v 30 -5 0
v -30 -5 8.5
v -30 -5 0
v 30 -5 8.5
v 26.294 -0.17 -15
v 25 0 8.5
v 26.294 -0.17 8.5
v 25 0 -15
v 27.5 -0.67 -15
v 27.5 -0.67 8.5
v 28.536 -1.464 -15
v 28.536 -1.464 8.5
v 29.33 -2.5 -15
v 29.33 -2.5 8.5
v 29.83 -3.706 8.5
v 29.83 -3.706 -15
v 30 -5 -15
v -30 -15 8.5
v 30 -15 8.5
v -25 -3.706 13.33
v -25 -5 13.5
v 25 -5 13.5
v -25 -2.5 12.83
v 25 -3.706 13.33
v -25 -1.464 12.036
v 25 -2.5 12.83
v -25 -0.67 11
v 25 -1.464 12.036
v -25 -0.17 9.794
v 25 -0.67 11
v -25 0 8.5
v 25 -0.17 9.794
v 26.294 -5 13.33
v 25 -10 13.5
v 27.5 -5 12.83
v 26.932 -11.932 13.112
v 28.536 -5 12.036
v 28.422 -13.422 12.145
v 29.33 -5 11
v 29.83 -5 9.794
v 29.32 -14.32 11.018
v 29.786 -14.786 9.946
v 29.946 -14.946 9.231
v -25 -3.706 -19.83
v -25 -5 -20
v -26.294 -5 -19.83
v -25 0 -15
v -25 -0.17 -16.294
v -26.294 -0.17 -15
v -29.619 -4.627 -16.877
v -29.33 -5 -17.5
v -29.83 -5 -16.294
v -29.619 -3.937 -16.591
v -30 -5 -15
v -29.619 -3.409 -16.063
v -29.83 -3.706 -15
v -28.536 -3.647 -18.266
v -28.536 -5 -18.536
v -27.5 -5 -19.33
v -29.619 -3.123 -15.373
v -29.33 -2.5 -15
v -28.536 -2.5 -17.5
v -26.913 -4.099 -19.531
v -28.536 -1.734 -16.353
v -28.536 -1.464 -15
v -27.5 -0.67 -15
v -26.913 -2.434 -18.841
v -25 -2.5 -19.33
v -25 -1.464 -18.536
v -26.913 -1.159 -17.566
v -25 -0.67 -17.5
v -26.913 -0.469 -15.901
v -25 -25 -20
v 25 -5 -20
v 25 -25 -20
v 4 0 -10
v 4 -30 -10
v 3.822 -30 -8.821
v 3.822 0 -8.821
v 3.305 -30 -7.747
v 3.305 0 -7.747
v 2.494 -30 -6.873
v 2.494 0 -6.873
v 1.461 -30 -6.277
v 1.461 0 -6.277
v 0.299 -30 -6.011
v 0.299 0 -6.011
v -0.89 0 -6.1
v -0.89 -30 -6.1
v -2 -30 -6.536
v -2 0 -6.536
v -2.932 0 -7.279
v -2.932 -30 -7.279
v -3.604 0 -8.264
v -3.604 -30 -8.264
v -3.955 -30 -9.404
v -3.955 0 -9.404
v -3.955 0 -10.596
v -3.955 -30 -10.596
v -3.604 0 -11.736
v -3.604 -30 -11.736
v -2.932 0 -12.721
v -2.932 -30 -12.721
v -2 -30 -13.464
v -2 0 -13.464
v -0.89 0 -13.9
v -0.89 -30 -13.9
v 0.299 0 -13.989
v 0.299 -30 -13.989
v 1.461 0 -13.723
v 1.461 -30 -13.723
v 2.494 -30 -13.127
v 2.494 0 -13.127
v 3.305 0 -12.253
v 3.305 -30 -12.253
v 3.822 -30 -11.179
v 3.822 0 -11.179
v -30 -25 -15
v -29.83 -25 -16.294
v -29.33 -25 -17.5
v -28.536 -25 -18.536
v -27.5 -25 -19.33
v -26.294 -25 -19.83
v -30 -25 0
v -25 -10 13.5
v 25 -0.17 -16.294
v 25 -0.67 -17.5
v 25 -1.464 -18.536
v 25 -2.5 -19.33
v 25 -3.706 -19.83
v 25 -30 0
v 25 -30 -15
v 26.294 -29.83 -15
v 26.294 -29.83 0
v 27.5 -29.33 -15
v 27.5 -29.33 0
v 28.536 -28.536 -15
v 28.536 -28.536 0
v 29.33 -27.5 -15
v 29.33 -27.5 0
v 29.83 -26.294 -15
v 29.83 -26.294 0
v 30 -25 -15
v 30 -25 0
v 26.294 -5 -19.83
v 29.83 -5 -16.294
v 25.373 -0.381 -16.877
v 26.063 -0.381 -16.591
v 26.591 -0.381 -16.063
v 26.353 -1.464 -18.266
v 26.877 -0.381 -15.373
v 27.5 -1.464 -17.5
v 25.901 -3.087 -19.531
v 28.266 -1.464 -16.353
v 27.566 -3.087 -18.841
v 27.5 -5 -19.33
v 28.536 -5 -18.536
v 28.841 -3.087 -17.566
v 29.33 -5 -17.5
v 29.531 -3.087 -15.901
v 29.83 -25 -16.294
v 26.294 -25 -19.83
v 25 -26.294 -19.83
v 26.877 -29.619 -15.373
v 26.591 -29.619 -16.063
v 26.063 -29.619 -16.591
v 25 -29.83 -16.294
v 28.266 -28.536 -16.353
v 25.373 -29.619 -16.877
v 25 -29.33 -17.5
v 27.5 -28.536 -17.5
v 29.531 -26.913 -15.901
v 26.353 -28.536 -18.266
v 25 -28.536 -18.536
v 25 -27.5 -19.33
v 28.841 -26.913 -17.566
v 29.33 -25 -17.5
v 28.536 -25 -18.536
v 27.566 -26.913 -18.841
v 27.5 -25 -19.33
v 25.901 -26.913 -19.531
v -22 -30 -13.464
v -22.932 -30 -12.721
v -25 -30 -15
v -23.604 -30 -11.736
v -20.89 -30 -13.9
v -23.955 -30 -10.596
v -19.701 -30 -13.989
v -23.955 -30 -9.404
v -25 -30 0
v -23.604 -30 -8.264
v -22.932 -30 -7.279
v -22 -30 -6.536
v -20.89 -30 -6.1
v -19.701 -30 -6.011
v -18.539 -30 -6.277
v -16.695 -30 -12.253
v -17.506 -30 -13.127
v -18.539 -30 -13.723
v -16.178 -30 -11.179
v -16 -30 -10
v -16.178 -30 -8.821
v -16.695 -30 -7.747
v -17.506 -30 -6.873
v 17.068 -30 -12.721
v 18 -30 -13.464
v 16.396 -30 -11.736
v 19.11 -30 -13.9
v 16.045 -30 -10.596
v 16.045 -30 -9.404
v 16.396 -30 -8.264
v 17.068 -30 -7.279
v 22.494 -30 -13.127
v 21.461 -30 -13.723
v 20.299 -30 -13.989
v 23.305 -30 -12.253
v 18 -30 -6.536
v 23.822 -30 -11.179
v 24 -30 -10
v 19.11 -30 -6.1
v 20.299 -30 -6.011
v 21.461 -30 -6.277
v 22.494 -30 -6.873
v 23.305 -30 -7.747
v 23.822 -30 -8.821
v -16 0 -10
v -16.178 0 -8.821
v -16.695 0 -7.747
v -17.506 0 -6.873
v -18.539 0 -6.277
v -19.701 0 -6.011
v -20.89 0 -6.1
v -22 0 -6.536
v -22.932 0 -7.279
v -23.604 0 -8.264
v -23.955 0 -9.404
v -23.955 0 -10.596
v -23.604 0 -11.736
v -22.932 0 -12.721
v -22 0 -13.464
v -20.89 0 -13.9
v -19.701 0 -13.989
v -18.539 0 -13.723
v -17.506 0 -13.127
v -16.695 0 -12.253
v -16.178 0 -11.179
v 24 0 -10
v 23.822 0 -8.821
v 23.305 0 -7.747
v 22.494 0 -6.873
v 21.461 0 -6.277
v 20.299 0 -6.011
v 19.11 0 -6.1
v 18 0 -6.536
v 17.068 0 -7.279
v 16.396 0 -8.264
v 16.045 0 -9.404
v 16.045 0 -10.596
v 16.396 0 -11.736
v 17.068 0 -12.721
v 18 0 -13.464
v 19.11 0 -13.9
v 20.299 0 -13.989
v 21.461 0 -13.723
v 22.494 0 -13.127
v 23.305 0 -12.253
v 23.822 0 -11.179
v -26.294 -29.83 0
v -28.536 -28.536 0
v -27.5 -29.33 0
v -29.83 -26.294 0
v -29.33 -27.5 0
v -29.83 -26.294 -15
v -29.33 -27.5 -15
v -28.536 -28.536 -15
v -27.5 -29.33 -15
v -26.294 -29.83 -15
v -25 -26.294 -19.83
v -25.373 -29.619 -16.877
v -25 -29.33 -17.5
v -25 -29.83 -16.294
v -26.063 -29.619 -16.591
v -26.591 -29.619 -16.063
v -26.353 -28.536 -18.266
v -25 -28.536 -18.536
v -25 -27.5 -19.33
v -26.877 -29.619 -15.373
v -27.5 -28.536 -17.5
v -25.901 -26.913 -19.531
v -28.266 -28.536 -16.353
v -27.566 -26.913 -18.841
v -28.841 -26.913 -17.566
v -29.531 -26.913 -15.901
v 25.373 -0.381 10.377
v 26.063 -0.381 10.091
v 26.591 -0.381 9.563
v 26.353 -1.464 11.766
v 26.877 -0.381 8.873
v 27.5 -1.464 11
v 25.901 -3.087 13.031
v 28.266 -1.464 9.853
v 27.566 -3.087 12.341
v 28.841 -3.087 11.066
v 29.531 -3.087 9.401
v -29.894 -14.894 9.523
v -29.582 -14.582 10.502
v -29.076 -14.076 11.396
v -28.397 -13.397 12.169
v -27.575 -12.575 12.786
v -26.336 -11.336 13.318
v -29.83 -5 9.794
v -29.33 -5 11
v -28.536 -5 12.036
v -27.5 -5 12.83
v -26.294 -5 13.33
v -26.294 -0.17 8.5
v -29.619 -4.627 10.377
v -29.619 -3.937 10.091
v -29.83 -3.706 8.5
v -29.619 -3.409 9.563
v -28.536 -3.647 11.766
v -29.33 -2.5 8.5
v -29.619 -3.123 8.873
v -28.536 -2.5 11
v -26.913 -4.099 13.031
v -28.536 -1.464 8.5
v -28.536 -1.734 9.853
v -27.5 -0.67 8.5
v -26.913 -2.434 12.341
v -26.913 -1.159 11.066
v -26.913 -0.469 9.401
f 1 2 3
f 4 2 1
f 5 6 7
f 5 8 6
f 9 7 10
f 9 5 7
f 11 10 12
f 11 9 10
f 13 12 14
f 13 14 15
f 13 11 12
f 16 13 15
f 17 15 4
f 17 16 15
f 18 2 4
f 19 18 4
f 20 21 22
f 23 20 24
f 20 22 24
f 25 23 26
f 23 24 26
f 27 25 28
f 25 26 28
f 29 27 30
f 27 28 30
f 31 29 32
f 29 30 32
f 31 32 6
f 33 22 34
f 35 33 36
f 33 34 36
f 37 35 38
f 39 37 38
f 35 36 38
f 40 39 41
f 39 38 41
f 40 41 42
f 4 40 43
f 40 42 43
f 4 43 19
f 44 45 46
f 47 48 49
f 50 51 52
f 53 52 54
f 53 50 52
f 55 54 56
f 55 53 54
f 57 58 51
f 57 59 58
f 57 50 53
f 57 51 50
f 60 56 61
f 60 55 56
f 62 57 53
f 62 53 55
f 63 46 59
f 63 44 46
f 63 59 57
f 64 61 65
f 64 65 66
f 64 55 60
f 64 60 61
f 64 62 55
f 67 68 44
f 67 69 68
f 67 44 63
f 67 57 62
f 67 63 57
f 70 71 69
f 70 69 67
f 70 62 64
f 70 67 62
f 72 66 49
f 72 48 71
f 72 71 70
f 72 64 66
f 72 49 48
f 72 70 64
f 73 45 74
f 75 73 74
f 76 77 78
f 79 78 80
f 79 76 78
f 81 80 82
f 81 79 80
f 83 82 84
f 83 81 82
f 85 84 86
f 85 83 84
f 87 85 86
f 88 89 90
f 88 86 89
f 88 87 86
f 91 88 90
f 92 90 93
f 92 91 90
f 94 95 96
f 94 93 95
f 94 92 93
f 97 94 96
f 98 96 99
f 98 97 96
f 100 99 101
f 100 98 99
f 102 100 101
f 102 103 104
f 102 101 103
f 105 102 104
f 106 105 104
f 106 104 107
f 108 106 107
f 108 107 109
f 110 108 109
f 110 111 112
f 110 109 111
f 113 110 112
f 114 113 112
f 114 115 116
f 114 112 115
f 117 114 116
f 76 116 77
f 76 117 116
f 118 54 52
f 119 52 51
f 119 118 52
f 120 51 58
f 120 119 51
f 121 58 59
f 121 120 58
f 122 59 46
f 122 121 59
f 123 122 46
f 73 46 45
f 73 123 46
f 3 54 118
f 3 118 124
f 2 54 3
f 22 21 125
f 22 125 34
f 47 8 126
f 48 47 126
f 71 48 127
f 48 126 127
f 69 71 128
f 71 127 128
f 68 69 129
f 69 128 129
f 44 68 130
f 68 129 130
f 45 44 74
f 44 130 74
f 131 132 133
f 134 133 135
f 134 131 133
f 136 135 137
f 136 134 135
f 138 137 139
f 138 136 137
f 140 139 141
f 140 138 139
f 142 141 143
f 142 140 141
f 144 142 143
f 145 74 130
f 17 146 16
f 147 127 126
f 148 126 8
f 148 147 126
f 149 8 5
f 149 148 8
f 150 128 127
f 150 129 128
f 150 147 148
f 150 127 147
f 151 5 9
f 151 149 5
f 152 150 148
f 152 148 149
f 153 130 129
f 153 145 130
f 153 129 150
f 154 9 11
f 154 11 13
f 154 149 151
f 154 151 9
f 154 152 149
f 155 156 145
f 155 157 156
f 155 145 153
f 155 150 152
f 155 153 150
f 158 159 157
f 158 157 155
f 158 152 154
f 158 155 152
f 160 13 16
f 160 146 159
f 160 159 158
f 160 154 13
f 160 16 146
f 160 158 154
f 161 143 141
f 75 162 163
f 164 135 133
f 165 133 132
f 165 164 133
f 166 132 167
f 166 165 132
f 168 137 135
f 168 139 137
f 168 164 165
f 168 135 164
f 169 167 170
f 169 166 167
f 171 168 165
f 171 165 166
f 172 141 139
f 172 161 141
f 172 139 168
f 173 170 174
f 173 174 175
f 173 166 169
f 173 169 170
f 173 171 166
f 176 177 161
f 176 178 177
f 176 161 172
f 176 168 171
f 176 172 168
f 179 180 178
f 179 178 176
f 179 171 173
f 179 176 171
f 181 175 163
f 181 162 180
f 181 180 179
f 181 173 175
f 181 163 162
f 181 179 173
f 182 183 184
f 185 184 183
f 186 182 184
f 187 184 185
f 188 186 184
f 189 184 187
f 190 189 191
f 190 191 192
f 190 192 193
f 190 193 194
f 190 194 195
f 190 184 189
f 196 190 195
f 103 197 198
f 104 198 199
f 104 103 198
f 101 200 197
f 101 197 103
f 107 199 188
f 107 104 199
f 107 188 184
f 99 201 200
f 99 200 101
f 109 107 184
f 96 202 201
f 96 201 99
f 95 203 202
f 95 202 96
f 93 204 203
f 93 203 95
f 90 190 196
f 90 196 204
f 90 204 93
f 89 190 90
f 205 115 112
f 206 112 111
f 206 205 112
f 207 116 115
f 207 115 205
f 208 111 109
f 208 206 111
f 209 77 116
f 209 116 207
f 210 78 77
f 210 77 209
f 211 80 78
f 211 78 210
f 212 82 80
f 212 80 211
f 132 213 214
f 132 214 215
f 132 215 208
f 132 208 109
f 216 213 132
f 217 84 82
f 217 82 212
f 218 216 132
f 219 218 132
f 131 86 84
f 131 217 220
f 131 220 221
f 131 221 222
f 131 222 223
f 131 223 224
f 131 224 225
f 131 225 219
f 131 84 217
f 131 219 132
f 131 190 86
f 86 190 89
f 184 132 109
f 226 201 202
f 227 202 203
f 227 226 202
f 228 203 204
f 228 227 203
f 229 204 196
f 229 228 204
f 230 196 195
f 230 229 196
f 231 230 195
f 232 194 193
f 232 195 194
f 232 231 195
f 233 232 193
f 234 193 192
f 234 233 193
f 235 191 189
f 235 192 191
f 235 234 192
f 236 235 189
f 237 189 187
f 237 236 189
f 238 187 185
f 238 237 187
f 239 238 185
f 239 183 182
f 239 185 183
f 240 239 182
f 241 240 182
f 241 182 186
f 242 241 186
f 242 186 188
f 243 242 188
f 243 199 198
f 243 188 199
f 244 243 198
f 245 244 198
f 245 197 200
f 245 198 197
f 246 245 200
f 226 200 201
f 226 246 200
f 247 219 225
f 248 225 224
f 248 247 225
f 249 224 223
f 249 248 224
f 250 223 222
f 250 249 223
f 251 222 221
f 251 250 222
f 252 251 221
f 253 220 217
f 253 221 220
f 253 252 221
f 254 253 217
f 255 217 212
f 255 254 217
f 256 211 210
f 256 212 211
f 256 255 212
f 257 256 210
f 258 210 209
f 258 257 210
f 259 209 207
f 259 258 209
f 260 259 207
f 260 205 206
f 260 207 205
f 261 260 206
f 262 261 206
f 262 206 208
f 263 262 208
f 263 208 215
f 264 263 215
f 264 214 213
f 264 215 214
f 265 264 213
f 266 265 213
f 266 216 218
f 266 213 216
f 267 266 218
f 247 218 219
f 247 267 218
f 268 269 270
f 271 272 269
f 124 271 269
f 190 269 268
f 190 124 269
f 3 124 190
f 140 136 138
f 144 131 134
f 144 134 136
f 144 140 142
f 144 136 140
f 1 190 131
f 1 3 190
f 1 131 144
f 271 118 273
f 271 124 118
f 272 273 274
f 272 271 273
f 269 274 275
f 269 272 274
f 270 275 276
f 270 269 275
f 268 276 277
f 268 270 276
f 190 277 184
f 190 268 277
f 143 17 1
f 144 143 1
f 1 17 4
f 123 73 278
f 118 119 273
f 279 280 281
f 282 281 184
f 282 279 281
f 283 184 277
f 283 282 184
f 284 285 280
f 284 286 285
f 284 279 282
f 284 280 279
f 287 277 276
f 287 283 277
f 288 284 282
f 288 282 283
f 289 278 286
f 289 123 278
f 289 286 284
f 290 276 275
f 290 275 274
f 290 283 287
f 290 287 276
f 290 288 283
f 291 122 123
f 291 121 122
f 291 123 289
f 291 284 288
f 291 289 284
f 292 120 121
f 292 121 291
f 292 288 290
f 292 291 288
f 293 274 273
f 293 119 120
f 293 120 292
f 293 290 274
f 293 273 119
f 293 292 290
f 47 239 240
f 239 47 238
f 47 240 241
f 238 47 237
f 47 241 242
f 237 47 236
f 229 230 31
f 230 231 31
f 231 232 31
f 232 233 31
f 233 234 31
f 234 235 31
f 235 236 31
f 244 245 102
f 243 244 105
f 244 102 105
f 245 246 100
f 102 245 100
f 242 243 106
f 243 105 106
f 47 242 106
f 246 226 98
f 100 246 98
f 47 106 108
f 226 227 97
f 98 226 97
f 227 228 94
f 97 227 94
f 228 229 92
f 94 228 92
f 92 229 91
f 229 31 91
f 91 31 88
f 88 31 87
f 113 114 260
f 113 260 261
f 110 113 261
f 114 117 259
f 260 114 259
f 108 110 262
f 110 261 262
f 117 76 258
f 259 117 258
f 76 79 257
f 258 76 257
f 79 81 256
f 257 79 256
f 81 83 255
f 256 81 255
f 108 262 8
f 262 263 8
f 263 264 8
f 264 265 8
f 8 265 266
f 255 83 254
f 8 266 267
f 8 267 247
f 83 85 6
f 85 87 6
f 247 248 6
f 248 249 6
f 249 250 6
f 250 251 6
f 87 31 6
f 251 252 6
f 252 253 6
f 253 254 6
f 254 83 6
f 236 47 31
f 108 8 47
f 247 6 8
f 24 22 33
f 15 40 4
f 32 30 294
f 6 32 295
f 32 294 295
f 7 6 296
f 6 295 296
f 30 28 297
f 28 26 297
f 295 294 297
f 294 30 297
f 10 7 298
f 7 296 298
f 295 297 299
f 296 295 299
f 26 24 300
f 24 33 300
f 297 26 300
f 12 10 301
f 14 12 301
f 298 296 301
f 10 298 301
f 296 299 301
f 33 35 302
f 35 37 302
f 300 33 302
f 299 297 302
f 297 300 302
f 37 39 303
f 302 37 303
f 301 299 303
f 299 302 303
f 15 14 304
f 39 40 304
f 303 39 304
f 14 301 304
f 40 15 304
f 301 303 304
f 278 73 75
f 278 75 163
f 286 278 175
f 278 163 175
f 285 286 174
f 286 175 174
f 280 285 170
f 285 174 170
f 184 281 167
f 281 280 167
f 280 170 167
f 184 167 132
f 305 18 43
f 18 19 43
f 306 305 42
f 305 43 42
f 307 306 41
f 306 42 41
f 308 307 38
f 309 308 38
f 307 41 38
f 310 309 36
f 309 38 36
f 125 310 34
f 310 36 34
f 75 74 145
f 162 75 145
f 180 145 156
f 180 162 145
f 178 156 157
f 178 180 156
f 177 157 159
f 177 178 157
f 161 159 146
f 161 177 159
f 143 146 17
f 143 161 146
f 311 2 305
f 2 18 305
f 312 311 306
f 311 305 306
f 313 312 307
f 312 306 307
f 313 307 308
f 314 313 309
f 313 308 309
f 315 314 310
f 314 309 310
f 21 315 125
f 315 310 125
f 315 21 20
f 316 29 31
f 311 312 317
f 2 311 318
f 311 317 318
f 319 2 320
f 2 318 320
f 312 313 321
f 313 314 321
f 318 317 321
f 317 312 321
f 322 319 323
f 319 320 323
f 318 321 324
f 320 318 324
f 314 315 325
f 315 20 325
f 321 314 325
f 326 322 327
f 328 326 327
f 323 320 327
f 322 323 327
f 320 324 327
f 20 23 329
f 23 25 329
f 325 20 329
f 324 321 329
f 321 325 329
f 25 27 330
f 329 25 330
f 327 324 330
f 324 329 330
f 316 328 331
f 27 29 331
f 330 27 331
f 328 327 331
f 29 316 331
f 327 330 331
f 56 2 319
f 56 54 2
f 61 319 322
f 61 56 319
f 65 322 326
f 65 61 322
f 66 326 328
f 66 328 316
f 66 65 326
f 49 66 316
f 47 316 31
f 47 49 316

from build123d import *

# Parameters (mm, degrees)
F0_W     = 60
F0_H     = 20
F1_DEPTH = 30
F2_W     = 60
F2_H     = 8.5
F3_DEPTH = 5
F4_W     = 60
F4_H     = 5
F5_DEPTH = 15
F6_R     = 4
F7_DEPTH = 30.001
F8_R     = 4.99999


# Not quite as in the source:
# - a fillet or chamfer is up to 0.001 mm smaller than in the source, because OpenCascade refuses the exact size


with BuildPart() as f1:
    # F0 (on Front) → F1 (new body)
    with BuildSketch(Plane.XZ):
        with Locations((0, -10)):
            Rectangle(F0_W, F0_H)
    extrude(amount=F1_DEPTH)

    # F2 (on Front) → F3 (join)
    with BuildSketch(Plane.XZ):
        with Locations((0, 4.25)):
            Rectangle(F2_W, F2_H)
    extrude(amount=F3_DEPTH)

    # F4 (on Front) → F5 (join)
    with BuildSketch(Plane.XZ):
        with Locations((0, 11)):
            Rectangle(F4_W, F4_H)
    extrude(amount=F5_DEPTH)

    # F6 (on Front) → F7 (cut, through all)
    with BuildSketch(Plane.XZ):
        with Locations((-20, -10)):
            Circle(F6_R)
        with Locations((0, -10)):
            Circle(F6_R)
        with Locations((20, -10)):
            Circle(F6_R)
    extrude(amount=F7_DEPTH, mode=Mode.SUBTRACT)

    # F8 (radius 5 in the source; OpenCascade refuses exactly that, so slightly less here)
    f8_edges = [f1.edges().sort_by_distance(p)[0] for p in [
        (30, -15, -20),
        (30, -30, -10),
        (30, -7.5, 13.5),
        (0, 0, 13.5),
        (0, 0, -20),
        (-30, -15, -20),
        (0, -30, -20),
        (-30, -30, -10),
        (-30, -7.5, 13.5),
        (-30, 0, -3.25),
        (0, -15, 13.5),
        (30, 0, -3.25),
    ]]
    fillet(f8_edges, radius=F8_R)


solid = f1.part
